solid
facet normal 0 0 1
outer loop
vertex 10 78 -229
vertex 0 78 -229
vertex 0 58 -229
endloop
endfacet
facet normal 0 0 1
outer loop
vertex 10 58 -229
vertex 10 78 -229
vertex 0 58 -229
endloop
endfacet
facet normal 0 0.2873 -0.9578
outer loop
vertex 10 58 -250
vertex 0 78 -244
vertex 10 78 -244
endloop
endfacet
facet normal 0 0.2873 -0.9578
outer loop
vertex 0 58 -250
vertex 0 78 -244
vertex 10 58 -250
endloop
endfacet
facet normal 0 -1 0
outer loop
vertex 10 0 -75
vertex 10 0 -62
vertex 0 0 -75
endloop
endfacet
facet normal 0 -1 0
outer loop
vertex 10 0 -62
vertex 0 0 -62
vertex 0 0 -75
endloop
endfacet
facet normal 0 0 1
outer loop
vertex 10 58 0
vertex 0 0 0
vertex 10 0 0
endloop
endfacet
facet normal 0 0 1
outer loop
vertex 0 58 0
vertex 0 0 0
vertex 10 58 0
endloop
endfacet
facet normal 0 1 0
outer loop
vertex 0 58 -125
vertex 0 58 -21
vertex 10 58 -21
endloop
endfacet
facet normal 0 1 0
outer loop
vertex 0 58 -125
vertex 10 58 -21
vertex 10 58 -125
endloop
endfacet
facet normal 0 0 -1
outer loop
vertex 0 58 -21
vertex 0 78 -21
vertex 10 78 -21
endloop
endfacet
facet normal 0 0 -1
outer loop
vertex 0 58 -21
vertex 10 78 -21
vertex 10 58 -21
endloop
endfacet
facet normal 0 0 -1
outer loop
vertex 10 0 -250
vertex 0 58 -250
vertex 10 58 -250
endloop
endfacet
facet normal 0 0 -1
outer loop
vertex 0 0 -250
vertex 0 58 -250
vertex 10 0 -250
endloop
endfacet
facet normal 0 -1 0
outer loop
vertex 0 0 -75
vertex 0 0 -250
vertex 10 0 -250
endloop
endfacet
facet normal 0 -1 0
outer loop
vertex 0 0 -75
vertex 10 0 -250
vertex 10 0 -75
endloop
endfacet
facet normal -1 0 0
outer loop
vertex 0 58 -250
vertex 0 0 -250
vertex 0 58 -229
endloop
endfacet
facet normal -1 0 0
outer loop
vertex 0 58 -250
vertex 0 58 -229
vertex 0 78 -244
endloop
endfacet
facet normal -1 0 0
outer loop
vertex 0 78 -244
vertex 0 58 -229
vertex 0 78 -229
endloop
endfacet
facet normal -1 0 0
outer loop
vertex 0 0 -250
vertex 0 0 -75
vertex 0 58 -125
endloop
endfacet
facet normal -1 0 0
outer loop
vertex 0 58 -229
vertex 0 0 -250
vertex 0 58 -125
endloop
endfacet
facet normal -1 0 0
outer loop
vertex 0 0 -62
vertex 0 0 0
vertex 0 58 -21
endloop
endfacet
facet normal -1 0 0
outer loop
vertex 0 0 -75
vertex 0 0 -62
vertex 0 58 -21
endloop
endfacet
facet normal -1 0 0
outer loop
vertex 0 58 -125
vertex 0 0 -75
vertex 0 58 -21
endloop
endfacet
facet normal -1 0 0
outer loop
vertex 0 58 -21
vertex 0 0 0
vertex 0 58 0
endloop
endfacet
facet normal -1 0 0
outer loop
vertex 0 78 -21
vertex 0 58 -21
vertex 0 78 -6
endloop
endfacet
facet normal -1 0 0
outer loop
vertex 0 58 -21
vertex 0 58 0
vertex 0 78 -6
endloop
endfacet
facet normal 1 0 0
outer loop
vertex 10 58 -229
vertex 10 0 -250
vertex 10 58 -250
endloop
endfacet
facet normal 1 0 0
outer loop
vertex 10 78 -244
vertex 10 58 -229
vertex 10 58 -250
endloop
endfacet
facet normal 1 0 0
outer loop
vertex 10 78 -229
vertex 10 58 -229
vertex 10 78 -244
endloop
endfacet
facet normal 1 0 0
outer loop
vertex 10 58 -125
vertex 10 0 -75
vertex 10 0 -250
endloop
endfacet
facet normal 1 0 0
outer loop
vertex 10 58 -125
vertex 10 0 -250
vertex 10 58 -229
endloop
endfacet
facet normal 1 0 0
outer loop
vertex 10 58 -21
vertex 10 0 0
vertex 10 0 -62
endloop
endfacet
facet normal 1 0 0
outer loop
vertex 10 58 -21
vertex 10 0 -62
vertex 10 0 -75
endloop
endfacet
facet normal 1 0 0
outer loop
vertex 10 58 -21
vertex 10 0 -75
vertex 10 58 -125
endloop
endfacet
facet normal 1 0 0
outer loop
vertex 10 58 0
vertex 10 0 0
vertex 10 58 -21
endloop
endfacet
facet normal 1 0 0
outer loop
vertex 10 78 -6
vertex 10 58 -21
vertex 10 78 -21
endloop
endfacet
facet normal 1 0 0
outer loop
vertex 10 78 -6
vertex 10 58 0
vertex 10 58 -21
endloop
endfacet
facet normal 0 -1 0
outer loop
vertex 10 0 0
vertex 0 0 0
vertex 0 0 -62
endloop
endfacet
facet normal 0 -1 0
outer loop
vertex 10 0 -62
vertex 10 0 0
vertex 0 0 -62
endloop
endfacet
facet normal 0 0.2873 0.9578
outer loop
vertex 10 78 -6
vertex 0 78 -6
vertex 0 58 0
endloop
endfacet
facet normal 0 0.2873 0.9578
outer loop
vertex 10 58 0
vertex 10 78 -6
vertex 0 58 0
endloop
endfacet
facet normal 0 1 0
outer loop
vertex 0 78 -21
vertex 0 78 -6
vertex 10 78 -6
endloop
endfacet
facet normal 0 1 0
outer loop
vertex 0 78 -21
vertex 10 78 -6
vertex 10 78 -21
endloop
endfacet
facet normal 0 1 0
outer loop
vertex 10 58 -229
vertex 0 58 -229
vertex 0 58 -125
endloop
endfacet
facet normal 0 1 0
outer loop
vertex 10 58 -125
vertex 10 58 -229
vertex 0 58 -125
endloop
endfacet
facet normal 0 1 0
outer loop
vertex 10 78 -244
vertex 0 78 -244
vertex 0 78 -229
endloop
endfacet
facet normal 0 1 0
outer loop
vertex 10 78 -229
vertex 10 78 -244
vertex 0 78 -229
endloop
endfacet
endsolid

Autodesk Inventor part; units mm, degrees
ref_plane "YZ Plane" through (0, 0, 0) normal (1, 0, 0) x (0, 1, 0)
ref_plane "XZ Plane" through (0, 0, 0) normal (0, 1, 0) x (-1, 0, 0)
ref_plane "XY Plane" through (0, 0, 0) normal (0, 0, 1) x (1, 0, 0)
sketch "Sketch1" plane through (0, 0, 0) normal (1, 0, 0) x (0, 1, 0)
  line L0 (0, 0) -> (58, 0)
  line L1 (58, -250) -> (0, -250)
  line L2 (78, -6) -> (78, -21)
  line L3 (78, -21) -> (58, -21)
  line L4 (58, -21) -> (58, -125)
  line L5 (78, -21) -> (78, -6)
  line L6 (78, -21) -> (78, -6)
  line L7 (58, -229) -> (58, -125)
  line L8 (78, -229) -> (58, -229)
  line L9 (78, -244) -> (58, -250)
  line L10 (78, -244) -> (78, -229)
  line L11 (0, 0) -> (0, -62)
  line L12 (78, -6) -> (78, -21)
  line L13 (78, -229) -> (78, -244)
  line L14 (0, -250) -> (0, -75)
  line L15 (0, -62) -> (0, 0)
  line L16 (58, 0) -> (0, 0)
  line L17 (0, 0) -> (0, -62)
  line L18 (0, -75) -> (0, -250)
  line L19 (0, -250) -> (58, -250)
  line L20 (58, 0) -> (0, 0)
  line L21 (0, -62) -> (0, -75)
  line L22 (78, -6) -> (58, 0)
  dimension "d0" = 62
  dimension "d4" = 15
  dimension "d5" = 15
  dimension "d6" = 208
extrude "Extrusion1" add sketch "Sketch1" along normal blind 10
properties part number "Left Side" material "Steel"
